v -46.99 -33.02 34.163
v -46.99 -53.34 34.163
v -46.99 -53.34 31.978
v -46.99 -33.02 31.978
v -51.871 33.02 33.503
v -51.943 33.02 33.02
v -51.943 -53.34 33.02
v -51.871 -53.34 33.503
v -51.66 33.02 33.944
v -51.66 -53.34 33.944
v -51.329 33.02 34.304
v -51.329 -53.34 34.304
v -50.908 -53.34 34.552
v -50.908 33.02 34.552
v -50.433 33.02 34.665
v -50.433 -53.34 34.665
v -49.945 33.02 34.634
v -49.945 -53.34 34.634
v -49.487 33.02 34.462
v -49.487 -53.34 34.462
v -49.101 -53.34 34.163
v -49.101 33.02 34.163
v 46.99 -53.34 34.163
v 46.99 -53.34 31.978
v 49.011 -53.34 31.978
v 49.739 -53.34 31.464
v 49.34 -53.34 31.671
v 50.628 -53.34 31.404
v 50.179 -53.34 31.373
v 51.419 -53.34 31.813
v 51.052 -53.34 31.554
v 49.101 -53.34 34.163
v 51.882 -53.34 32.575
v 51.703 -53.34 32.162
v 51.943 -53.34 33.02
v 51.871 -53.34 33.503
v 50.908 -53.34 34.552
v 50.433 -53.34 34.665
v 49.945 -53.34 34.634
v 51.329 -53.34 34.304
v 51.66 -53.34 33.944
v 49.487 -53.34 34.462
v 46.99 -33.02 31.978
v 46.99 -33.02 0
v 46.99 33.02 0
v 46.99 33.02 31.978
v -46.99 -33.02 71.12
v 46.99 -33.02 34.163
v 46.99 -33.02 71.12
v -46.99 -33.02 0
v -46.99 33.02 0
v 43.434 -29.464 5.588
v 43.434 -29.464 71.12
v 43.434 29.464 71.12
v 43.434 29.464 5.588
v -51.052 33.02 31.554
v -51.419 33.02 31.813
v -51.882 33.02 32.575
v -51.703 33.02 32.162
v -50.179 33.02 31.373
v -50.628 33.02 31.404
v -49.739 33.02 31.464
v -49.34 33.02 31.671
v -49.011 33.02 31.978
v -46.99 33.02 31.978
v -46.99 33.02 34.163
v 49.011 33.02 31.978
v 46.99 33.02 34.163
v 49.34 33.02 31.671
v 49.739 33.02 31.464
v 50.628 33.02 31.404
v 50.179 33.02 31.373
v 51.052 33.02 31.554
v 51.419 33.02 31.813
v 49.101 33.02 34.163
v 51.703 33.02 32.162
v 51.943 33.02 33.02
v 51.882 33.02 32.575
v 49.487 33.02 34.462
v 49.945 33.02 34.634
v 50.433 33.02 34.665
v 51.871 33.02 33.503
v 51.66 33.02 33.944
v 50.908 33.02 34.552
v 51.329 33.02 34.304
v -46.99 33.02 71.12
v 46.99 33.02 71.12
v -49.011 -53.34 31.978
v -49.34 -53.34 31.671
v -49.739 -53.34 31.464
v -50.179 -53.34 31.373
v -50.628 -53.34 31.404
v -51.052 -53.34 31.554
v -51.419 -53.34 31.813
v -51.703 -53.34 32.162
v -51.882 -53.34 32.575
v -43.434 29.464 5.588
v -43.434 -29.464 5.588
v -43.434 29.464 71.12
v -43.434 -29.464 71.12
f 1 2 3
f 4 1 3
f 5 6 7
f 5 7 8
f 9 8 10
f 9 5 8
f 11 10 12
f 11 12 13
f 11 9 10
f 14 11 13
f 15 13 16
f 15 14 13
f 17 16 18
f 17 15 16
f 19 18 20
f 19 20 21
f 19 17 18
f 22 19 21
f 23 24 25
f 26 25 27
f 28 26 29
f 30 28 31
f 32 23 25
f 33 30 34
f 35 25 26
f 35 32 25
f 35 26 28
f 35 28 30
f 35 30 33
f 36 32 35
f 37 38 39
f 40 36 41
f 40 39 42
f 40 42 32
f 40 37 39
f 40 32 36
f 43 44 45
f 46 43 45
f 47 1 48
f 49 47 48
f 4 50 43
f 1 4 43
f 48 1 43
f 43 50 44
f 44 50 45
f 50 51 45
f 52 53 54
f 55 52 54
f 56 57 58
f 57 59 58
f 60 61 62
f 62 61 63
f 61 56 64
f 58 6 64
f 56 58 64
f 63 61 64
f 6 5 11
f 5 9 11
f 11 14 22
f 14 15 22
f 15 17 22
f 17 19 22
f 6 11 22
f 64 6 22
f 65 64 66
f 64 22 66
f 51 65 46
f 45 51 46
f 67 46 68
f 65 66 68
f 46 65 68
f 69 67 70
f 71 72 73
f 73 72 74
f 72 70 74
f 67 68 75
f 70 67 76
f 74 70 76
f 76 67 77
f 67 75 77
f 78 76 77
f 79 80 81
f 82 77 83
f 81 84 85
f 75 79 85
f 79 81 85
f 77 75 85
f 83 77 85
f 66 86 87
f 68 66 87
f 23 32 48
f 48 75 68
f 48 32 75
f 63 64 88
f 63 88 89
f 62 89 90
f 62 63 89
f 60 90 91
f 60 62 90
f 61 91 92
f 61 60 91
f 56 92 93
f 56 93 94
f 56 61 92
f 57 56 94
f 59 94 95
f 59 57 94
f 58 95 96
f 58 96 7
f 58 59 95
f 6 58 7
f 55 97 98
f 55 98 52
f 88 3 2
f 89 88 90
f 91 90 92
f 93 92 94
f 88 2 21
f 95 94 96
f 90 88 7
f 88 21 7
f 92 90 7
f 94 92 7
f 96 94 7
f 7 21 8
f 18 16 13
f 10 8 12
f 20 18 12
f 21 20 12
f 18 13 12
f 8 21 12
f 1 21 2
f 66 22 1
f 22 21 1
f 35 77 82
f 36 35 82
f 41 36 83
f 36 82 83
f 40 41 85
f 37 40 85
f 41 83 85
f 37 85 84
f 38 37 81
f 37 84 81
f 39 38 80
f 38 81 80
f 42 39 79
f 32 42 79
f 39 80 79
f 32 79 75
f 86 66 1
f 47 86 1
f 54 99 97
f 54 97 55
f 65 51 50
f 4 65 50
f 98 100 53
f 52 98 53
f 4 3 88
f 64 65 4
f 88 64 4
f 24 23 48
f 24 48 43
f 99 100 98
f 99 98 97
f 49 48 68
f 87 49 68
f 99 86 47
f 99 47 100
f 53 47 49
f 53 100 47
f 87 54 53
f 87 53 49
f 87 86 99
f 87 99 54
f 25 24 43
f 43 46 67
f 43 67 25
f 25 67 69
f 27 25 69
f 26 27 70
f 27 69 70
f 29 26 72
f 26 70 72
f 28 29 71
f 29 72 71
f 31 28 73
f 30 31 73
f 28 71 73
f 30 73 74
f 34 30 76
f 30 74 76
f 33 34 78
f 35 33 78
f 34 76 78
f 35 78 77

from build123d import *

# Parameters (mm, degrees)
F0_W     = 46.99
F0_H     = 33.02
F1_DEPTH = 71.12
F3_DEPTH = 86.36
F5_W     = 86.868
F5_H     = 58.928
F6_DEPTH = 65.532


with BuildPart() as f1:
    # F0 (on Top) → F1 (new body)
    with BuildSketch(Plane.XY):
        with Locations((-23.495, -16.51)):
            Rectangle(F0_W, F0_H)
        Polygon((0, 0), (0, -33.02), (46.99, -33.02), (46.99, 33.02), (-46.99, 33.02), (-46.99, 0), align=None)
    extrude(amount=F1_DEPTH)

    # F2 (on face) → F3 (join)
    with BuildSketch(Plane(origin=(0, 33.02, 0), x_dir=(-1, 0, 0), z_dir=(0, 1, 0))):
        with BuildLine():
            ThreePointArc((49.0112789095, 31.9781005383), (48.6423795188, 33.0874779076), (49.1006532674, 34.1630196685))
            Line((49.1006532674, 34.1630196685), (46.99, 34.1630196685))
            Line((46.99, 34.1630196685), (46.99, 31.9781005383))
            Line((46.99, 31.9781005383), (49.0112789095, 31.9781005383))
        make_face()
        with BuildLine():
            Line((49.1006532674, 31.9781005383), (49.1006532674, 34.1630196685))
            ThreePointArc((49.1006532674, 34.1630196685), (48.6423795188, 33.0874779076), (49.0112789095, 31.9781005383))
            Line((49.0112789095, 31.9781005383), (49.1006532674, 31.9781005383))
        make_face()
        with BuildLine():
            ThreePointArc((49.0112789095, 31.9781005383), (50.8448700026, 31.464321447), (51.943, 33.02))
            ThreePointArc((51.943, 33.02), (50.9079900748, 34.5517823696), (49.1006532674, 34.1630196685))
            Line((49.1006532674, 34.1630196685), (49.1006532674, 31.9781005383))
            Line((49.1006532674, 31.9781005383), (49.0112789095, 31.9781005383))
        make_face()
    extrude(amount=-F3_DEPTH)

    # F4: F1 across plane


with BuildPart() as f1_1:
    add(f1.part)
    add(f1.part.mirror(Plane.YZ))

    # F5 (on face) → F6 (cut)
    with BuildSketch(Plane.XY.offset(71.12)):
        Rectangle(F5_W, F5_H)
    extrude(amount=-F6_DEPTH, mode=Mode.SUBTRACT)


solid = f1_1.part
